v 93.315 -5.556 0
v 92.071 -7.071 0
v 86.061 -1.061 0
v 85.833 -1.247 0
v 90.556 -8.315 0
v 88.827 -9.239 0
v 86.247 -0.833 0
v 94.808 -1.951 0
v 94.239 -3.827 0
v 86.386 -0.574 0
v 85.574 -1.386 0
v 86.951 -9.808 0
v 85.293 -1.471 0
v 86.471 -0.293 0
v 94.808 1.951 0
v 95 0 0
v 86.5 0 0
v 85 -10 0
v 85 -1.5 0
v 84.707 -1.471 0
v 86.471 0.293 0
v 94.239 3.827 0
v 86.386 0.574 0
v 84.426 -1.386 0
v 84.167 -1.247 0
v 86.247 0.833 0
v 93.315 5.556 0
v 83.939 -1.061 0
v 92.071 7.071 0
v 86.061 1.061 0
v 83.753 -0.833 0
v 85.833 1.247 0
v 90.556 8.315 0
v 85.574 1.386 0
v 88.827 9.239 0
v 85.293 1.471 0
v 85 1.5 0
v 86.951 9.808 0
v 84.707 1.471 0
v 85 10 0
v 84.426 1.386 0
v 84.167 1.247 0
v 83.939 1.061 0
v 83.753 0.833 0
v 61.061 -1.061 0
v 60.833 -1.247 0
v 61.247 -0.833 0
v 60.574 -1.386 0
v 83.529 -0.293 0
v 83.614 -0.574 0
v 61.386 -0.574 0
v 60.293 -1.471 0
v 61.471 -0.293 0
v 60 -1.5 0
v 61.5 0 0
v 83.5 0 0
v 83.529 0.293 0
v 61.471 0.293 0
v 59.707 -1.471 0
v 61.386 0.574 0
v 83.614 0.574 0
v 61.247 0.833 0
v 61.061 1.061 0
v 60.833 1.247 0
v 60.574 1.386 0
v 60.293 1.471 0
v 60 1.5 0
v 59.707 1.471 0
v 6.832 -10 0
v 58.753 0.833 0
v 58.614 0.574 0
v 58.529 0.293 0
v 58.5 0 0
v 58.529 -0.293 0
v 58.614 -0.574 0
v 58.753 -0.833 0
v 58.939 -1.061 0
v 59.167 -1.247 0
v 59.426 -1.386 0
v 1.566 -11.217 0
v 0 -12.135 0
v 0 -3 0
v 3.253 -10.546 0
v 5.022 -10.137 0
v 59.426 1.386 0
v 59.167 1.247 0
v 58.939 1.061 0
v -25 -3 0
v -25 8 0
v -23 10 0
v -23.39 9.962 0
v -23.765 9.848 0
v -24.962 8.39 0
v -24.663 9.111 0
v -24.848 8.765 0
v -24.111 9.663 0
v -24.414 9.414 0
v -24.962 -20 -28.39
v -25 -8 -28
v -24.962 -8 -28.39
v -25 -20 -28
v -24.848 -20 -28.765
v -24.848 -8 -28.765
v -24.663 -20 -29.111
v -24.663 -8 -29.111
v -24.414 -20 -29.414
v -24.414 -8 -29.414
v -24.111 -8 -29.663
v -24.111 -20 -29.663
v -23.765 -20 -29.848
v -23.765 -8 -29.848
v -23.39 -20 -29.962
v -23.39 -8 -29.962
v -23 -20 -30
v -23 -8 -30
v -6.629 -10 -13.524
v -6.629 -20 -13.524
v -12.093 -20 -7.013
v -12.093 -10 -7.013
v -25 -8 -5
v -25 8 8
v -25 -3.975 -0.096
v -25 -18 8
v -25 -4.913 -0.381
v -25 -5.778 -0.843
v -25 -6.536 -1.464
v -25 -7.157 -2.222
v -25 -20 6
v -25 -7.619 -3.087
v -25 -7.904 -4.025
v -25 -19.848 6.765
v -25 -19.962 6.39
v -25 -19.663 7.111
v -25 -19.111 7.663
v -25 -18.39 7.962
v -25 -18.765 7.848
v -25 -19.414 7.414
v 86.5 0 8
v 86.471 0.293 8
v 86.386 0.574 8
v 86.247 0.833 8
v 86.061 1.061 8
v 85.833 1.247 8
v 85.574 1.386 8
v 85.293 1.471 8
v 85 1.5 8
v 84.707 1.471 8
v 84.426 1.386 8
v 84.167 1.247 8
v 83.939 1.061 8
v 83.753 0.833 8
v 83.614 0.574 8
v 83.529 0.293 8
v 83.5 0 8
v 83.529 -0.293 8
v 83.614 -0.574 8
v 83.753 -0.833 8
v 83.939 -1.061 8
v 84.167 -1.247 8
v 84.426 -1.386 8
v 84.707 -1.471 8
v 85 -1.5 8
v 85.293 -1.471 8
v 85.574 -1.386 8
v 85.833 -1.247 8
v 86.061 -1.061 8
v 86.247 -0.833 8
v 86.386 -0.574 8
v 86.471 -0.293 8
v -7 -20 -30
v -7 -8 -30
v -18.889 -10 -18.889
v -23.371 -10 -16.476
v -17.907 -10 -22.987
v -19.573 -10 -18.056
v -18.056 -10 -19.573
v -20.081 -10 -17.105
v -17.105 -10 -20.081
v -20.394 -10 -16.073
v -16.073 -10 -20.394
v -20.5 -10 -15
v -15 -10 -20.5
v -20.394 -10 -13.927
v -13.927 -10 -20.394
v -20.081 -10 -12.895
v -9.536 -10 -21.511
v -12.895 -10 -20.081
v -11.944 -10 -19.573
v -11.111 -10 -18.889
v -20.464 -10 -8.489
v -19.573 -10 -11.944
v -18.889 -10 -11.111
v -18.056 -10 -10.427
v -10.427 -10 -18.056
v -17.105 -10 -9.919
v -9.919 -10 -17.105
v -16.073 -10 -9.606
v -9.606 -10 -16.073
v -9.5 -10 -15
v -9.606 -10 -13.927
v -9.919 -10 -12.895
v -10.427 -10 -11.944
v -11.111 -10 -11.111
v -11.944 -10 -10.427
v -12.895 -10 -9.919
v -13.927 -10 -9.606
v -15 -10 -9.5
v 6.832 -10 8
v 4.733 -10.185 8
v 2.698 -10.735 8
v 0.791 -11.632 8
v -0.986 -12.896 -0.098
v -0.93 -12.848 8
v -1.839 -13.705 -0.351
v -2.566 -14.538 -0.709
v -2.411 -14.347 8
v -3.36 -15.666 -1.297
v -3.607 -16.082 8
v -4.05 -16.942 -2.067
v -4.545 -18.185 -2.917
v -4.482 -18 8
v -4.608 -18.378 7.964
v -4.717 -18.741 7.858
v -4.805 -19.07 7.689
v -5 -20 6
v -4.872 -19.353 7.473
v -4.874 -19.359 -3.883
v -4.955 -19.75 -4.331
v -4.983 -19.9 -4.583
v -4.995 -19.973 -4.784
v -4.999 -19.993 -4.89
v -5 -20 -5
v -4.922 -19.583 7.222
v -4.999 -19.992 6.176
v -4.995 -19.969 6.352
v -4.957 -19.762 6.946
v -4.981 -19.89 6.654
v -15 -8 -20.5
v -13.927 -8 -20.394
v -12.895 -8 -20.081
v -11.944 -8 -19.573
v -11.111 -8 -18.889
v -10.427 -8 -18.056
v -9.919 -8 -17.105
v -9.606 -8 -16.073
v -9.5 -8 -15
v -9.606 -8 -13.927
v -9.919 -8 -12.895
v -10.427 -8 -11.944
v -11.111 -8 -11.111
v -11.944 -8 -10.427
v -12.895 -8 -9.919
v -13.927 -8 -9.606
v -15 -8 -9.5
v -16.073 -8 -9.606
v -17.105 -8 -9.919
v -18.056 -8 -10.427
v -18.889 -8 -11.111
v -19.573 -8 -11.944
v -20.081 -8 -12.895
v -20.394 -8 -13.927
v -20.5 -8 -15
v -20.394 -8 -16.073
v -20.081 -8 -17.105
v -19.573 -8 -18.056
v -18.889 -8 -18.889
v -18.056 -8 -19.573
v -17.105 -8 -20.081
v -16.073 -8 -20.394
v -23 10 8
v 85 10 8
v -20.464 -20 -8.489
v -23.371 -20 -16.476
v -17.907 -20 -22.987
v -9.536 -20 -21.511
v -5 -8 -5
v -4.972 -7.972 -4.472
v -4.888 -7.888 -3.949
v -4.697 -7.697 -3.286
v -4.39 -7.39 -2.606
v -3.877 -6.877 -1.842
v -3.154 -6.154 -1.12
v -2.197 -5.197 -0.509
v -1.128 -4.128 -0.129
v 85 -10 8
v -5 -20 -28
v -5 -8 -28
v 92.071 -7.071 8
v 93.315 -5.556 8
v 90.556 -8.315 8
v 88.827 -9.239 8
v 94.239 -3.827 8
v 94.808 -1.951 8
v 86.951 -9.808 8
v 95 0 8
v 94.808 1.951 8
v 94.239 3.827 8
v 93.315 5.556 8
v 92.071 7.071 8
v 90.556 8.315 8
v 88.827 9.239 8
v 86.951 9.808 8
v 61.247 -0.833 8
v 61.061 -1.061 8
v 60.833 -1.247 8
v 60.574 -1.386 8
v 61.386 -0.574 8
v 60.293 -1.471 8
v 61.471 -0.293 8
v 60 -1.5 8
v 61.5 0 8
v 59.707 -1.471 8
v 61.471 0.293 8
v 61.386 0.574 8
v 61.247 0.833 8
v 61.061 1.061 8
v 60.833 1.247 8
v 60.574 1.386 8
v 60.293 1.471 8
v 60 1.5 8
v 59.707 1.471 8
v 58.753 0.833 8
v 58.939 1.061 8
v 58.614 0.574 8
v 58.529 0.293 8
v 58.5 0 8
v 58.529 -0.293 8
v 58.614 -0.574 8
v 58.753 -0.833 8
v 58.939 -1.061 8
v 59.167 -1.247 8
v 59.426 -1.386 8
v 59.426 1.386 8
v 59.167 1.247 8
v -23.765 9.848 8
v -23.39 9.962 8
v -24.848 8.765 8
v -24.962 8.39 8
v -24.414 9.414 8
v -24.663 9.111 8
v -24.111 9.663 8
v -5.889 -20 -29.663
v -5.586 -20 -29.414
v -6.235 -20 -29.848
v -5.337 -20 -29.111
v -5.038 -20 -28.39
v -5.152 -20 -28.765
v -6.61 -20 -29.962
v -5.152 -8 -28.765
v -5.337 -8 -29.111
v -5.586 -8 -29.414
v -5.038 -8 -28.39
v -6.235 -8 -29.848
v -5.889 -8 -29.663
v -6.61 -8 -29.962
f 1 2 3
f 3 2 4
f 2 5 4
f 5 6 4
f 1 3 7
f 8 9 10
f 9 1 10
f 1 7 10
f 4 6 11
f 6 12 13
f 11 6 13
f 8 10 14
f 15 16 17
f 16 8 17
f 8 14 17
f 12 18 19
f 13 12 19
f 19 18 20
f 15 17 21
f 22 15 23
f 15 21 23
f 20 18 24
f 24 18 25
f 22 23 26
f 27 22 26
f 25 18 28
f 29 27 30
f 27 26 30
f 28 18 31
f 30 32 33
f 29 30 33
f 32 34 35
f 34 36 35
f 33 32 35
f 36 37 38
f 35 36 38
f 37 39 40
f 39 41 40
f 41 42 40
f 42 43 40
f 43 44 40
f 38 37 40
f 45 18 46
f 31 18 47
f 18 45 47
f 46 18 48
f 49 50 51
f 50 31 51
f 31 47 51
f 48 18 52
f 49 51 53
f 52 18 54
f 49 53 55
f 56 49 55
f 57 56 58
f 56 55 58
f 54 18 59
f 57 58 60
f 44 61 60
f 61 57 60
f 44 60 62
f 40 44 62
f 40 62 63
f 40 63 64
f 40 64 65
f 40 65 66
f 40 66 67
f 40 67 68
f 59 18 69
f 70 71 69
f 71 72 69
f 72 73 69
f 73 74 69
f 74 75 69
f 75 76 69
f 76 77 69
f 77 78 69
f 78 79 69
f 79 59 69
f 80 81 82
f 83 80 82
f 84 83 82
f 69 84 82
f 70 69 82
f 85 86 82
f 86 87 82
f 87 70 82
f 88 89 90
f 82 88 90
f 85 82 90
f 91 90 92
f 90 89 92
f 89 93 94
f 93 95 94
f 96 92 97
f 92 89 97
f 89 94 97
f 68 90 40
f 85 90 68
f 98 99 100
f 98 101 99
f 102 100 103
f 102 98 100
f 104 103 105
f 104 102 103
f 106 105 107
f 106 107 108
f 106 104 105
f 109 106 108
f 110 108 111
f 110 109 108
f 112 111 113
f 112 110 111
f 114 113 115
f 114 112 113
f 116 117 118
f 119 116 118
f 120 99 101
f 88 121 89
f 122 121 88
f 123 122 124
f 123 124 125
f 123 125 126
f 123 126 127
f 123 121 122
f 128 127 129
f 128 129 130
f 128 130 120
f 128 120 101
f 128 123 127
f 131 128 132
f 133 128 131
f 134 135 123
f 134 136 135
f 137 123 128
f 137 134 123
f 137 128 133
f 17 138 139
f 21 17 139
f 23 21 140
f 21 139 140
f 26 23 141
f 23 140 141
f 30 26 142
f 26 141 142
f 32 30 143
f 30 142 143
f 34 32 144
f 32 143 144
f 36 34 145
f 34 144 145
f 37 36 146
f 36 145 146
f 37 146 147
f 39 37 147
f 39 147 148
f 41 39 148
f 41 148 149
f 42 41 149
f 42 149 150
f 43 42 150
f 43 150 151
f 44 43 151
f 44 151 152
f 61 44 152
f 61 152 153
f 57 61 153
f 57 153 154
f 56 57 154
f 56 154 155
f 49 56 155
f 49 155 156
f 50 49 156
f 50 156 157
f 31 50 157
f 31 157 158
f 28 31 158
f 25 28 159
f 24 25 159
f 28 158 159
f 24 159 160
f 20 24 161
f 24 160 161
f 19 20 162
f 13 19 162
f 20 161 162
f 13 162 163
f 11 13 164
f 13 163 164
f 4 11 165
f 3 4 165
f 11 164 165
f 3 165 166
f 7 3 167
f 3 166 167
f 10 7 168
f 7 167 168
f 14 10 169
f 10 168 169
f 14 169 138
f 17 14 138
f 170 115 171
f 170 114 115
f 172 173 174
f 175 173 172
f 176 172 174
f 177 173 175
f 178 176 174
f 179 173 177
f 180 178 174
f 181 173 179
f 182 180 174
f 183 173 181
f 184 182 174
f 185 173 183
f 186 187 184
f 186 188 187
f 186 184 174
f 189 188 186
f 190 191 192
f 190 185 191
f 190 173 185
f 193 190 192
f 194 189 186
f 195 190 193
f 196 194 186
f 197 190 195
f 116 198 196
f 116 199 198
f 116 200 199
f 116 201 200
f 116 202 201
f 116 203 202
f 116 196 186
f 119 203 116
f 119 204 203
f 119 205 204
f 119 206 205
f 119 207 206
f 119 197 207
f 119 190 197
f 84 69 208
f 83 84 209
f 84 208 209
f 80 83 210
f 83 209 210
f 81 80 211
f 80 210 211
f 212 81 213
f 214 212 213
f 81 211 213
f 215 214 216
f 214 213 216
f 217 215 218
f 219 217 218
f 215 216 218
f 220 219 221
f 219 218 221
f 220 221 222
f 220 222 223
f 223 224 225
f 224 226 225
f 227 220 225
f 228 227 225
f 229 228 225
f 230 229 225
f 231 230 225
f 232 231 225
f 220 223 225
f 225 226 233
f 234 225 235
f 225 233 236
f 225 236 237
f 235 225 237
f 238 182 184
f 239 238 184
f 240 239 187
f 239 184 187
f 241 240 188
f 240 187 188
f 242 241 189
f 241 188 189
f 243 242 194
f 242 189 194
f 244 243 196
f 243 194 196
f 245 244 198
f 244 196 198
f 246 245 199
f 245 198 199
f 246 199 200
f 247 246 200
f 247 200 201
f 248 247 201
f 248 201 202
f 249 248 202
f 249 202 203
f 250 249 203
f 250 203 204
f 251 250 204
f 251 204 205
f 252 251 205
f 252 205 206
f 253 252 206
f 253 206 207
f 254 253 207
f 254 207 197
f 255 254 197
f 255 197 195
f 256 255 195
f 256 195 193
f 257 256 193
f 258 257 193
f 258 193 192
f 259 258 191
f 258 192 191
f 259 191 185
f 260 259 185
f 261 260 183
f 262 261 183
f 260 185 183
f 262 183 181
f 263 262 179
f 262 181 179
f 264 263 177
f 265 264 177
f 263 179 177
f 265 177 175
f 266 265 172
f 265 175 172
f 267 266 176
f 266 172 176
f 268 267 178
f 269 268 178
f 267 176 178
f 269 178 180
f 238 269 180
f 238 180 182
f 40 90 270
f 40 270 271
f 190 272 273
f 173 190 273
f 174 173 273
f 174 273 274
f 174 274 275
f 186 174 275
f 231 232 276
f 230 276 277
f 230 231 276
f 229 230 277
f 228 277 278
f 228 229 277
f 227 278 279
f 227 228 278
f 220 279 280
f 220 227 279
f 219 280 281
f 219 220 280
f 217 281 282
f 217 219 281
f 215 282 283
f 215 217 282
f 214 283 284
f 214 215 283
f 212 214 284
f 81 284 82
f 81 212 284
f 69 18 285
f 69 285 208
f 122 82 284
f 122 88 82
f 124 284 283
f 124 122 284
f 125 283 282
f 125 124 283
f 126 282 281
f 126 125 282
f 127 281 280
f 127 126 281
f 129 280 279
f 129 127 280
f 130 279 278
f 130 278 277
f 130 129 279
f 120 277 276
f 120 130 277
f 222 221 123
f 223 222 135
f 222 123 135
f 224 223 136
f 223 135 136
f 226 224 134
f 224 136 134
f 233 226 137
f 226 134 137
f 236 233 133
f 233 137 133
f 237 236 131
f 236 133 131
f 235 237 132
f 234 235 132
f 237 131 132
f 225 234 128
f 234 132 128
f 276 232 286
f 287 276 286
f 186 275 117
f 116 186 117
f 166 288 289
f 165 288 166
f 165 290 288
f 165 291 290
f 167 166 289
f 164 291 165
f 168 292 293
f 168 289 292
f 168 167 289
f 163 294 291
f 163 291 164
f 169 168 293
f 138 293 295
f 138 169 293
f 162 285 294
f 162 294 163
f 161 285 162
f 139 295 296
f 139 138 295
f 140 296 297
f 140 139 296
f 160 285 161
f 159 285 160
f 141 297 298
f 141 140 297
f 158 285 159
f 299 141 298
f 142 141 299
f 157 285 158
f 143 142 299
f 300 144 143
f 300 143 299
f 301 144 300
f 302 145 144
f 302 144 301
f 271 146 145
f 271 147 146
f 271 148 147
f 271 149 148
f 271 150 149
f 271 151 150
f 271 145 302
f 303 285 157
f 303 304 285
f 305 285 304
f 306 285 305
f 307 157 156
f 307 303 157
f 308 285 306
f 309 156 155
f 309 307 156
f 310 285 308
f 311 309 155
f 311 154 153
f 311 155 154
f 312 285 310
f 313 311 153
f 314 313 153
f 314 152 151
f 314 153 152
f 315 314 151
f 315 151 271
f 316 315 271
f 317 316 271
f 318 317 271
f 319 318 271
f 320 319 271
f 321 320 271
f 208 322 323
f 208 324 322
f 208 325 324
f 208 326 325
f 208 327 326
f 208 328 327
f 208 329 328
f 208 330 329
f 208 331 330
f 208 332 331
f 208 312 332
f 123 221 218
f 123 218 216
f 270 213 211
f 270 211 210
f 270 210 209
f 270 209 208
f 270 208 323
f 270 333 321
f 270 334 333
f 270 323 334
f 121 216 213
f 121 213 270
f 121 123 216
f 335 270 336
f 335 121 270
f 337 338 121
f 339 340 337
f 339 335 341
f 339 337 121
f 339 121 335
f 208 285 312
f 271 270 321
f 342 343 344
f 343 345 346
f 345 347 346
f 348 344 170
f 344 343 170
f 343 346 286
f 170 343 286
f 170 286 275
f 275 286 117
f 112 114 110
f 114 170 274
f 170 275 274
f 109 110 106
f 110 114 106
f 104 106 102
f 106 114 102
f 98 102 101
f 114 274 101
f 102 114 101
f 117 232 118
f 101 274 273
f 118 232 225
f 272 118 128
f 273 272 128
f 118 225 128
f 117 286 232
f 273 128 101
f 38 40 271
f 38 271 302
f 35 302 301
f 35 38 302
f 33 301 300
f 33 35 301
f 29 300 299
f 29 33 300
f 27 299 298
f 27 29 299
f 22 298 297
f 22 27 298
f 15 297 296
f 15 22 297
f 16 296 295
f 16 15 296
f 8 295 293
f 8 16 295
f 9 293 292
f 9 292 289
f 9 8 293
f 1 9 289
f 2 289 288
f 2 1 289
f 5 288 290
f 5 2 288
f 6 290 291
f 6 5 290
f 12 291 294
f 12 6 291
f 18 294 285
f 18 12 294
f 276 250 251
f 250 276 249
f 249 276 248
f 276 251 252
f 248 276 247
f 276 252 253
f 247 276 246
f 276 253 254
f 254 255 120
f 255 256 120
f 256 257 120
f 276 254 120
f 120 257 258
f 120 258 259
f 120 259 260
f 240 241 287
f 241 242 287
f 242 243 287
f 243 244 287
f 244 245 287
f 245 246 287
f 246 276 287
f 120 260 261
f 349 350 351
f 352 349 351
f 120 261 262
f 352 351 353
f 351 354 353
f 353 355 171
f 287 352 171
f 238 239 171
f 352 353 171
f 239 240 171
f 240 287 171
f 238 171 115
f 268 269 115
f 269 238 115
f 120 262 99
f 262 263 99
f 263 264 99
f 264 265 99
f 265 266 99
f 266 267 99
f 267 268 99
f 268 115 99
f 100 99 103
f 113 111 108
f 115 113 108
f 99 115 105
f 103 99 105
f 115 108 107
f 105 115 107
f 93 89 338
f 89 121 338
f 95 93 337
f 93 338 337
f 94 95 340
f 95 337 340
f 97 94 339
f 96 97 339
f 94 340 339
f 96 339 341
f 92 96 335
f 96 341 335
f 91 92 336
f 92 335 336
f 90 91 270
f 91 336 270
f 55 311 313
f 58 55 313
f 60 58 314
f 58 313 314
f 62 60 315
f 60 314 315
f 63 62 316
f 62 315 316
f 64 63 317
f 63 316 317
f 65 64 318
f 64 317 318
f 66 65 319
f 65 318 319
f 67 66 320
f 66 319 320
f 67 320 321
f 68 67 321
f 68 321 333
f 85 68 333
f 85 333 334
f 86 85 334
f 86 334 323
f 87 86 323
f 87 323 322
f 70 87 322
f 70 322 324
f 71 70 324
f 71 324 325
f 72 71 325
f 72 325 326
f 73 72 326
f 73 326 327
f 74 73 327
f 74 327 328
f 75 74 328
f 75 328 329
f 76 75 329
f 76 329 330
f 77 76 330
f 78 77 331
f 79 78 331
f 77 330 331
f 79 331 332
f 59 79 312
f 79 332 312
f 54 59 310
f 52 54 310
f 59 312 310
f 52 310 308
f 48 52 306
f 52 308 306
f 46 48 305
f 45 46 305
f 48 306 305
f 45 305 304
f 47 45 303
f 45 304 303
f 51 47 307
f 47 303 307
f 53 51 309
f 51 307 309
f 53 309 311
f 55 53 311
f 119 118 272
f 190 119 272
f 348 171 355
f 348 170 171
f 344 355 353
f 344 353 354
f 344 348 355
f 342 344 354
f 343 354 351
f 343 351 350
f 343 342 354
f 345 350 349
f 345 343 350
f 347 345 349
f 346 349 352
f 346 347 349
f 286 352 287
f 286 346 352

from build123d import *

# Parameters (mm, degrees)
BOSS_EXTRUDE1_DEPTH      = 8
SKETCH2_R                = 1.5
CUT_EXTRUDE1_DEPTH       = 10
BOSS_EXTRUDE3_DEPTH      = 30
BOSS_EXTRUDE3_DEPTH_BACK = 8
SKETCH6_W                = 20
SKETCH6_H                = 10
FILLET3_R                = 12
SKETCH7_W                = 20
SKETCH7_H                = 30
BOSS_EXTRUDE4_DEPTH      = 2
CUT_EXTRUDE3_DEPTH       = 10
SKETCH9_R                = 5.5
CUT_EXTRUDE4_DEPTH       = 10
FILLET4_R                = 5
FILLET5_R                = 2
SKETCH10_R               = 1.5
CUT_EXTRUDE5_DEPTH       = 10


with BuildPart() as part:
    # Sketch1 → Boss-Extrude1 (new body)
    with BuildSketch(Plane.XY):
        with BuildLine():
            Line((-25, 10), (85, 10))
            ThreePointArc((85, 10), (95, 0), (85, -10))
            Line((85, -10), (-25, -10))
            Line((-25, -10), (-25, 10))
        make_face()
    extrude(amount=BOSS_EXTRUDE1_DEPTH)

    # Sketch2 → Cut-Extrude1 (cut)
    with BuildSketch(Plane.XY.offset(8)):
        with Locations((85, 0)):
            Circle(SKETCH2_R)
    extrude(amount=-CUT_EXTRUDE1_DEPTH, mode=Mode.SUBTRACT)

    # Sketch6 → Boss-Extrude3 (add, two sides: drawn at the far end of the back side and taken through both)
    with BuildSketch(Plane(origin=(0, 0, 0), x_dir=(-1, 0, 0), z_dir=(0, 0, -1)).offset(-BOSS_EXTRUDE3_DEPTH_BACK)):
        with Locations((15, -15)):
            Rectangle(SKETCH6_W, SKETCH6_H)
    extrude(amount=BOSS_EXTRUDE3_DEPTH + BOSS_EXTRUDE3_DEPTH_BACK)

    # Fillet3
    # the kernel refuses this fillet: 12 mm, written as the material it adds along each edge
    with BuildSketch(Plane(origin=(-5, -10, 8), x_dir=(0, -1, 0), z_dir=(0, 0, -1))) as fillet3_piece_1:
        with BuildLine():
            CenterArc((12, -11.832159566), FILLET3_R, 99.594068227, 80.405931773)
            Line((0, -11.832159566), (0, 0))
            Line((0, 0), (10, 0))
        make_face()
    extrude(amount=8)

    # Sketch7 → Boss-Extrude4 (add)
    with BuildSketch(Plane(origin=(0, -10, 0), x_dir=(1, 0, 0), z_dir=(0, 1, 0))):
        with Locations((-15, 15)):
            Rectangle(SKETCH7_W, SKETCH7_H)
    extrude(amount=BOSS_EXTRUDE4_DEPTH)

    # Sketch8 → Cut-Extrude3 (cut)
    with BuildSketch(Plane.XZ.offset(20)):
        Polygon((-12.092828782, -7.012612723), (-20.463694682, -8.488622233), (-23.370865901, -16.47600951), (-17.907171218, -22.987387277), (-9.536305318, -21.511377767), (-6.629134099, -13.52399049), align=None)
    extrude(amount=-CUT_EXTRUDE3_DEPTH, mode=Mode.SUBTRACT)

    # Sketch9 → Cut-Extrude4 (cut)
    with BuildSketch(Plane.XZ.offset(10)):
        with Locations(Location((-15, -15, 0), (0, 0, 270))):
            Circle(SKETCH9_R)
    extrude(amount=-CUT_EXTRUDE4_DEPTH, mode=Mode.SUBTRACT)

    # Fillet4
    # the kernel refuses this fillet: 5 mm, written as the material it adds along each edge
    with BuildSketch(Plane(origin=(-5, -20, 0), x_dir=(1, 0, 0), z_dir=(0, 1, 0))) as fillet4_piece_1_section:
        with BuildLine():
            CenterArc((FILLET4_R, FILLET4_R), FILLET4_R, 180, 90)
            Line((0, FILLET4_R), (0, 0))
            Line((0, 0), (FILLET4_R, 0))
        make_face()
    fillet4_piece_1 = extrude(amount=12, mode=Mode.PRIVATE)
    fillet4_piece_1 = fillet4_piece_1 - Plane(origin=(6.832159566, -22, 0), x_dir=(0, -1, 0), z_dir=(0, 0, 1)) * Cylinder(12, 44, mode=Mode.PRIVATE)
    add(fillet4_piece_1)
    with BuildSketch(Plane(origin=(-25, -8, 0), x_dir=(0, 1, 0), z_dir=(1, 0, 0))) as fillet4_piece_2:
        with BuildLine():
            CenterArc((FILLET4_R, -FILLET4_R), FILLET4_R, 90, 90)
            Line((0, -FILLET4_R), (0, 0))
            Line((0, 0), (FILLET4_R, 0))
        make_face()
    extrude(amount=20)
    with BuildSketch(Plane(origin=(-5, -20, 0), x_dir=(1, 0, 0), z_dir=(0, 1, 0))) as fillet4_piece_3a_section:
        with BuildLine():
            CenterArc((FILLET4_R, FILLET4_R), FILLET4_R, 180, 90)
            Line((0, FILLET4_R), (0, 0))
            Line((0, 0), (FILLET4_R, 0))
        make_face()
    fillet4_piece_3a = extrude(amount=24.5, mode=Mode.PRIVATE)
    fillet4_piece_3a = split(fillet4_piece_3a, bisect_by=Plane(origin=(-5, -8, 0), z_dir=(0, 1, 0)), keep=Keep.TOP, mode=Mode.PRIVATE)
    with BuildSketch(Plane(origin=(-25, -8, 0), x_dir=(0, 1, 0), z_dir=(1, 0, 0))) as fillet4_piece_3b_section:
        with BuildLine():
            CenterArc((FILLET4_R, -FILLET4_R), FILLET4_R, 90, 90)
            Line((0, -FILLET4_R), (0, 0))
            Line((0, 0), (FILLET4_R, 0))
        make_face()
    fillet4_piece_3b = extrude(amount=32.5, mode=Mode.PRIVATE)
    fillet4_piece_3b = split(fillet4_piece_3b, bisect_by=Plane(origin=(-5, -8, 0), z_dir=(1, 0, 0)), keep=Keep.TOP, mode=Mode.PRIVATE)
    fillet4_piece_3 = fillet4_piece_3a & fillet4_piece_3b
    add(fillet4_piece_3)

    # Fillet5
    fillet5_edges = [part.edges().sort_by_distance(p)[0] for p in [
        (-15, -20, 8),
        (-25, -14, -30),
        (-5, -14, -30),
        (-25, 10, 4),
    ]]
    fillet(fillet5_edges, radius=FILLET5_R)

    # Sketch10 → Cut-Extrude5 (cut)
    with BuildSketch(Plane.XY.offset(8)):
        with Locations((60, 0)):
            Circle(SKETCH10_R)
    extrude(amount=-CUT_EXTRUDE5_DEPTH, mode=Mode.SUBTRACT)


solid = part.part
